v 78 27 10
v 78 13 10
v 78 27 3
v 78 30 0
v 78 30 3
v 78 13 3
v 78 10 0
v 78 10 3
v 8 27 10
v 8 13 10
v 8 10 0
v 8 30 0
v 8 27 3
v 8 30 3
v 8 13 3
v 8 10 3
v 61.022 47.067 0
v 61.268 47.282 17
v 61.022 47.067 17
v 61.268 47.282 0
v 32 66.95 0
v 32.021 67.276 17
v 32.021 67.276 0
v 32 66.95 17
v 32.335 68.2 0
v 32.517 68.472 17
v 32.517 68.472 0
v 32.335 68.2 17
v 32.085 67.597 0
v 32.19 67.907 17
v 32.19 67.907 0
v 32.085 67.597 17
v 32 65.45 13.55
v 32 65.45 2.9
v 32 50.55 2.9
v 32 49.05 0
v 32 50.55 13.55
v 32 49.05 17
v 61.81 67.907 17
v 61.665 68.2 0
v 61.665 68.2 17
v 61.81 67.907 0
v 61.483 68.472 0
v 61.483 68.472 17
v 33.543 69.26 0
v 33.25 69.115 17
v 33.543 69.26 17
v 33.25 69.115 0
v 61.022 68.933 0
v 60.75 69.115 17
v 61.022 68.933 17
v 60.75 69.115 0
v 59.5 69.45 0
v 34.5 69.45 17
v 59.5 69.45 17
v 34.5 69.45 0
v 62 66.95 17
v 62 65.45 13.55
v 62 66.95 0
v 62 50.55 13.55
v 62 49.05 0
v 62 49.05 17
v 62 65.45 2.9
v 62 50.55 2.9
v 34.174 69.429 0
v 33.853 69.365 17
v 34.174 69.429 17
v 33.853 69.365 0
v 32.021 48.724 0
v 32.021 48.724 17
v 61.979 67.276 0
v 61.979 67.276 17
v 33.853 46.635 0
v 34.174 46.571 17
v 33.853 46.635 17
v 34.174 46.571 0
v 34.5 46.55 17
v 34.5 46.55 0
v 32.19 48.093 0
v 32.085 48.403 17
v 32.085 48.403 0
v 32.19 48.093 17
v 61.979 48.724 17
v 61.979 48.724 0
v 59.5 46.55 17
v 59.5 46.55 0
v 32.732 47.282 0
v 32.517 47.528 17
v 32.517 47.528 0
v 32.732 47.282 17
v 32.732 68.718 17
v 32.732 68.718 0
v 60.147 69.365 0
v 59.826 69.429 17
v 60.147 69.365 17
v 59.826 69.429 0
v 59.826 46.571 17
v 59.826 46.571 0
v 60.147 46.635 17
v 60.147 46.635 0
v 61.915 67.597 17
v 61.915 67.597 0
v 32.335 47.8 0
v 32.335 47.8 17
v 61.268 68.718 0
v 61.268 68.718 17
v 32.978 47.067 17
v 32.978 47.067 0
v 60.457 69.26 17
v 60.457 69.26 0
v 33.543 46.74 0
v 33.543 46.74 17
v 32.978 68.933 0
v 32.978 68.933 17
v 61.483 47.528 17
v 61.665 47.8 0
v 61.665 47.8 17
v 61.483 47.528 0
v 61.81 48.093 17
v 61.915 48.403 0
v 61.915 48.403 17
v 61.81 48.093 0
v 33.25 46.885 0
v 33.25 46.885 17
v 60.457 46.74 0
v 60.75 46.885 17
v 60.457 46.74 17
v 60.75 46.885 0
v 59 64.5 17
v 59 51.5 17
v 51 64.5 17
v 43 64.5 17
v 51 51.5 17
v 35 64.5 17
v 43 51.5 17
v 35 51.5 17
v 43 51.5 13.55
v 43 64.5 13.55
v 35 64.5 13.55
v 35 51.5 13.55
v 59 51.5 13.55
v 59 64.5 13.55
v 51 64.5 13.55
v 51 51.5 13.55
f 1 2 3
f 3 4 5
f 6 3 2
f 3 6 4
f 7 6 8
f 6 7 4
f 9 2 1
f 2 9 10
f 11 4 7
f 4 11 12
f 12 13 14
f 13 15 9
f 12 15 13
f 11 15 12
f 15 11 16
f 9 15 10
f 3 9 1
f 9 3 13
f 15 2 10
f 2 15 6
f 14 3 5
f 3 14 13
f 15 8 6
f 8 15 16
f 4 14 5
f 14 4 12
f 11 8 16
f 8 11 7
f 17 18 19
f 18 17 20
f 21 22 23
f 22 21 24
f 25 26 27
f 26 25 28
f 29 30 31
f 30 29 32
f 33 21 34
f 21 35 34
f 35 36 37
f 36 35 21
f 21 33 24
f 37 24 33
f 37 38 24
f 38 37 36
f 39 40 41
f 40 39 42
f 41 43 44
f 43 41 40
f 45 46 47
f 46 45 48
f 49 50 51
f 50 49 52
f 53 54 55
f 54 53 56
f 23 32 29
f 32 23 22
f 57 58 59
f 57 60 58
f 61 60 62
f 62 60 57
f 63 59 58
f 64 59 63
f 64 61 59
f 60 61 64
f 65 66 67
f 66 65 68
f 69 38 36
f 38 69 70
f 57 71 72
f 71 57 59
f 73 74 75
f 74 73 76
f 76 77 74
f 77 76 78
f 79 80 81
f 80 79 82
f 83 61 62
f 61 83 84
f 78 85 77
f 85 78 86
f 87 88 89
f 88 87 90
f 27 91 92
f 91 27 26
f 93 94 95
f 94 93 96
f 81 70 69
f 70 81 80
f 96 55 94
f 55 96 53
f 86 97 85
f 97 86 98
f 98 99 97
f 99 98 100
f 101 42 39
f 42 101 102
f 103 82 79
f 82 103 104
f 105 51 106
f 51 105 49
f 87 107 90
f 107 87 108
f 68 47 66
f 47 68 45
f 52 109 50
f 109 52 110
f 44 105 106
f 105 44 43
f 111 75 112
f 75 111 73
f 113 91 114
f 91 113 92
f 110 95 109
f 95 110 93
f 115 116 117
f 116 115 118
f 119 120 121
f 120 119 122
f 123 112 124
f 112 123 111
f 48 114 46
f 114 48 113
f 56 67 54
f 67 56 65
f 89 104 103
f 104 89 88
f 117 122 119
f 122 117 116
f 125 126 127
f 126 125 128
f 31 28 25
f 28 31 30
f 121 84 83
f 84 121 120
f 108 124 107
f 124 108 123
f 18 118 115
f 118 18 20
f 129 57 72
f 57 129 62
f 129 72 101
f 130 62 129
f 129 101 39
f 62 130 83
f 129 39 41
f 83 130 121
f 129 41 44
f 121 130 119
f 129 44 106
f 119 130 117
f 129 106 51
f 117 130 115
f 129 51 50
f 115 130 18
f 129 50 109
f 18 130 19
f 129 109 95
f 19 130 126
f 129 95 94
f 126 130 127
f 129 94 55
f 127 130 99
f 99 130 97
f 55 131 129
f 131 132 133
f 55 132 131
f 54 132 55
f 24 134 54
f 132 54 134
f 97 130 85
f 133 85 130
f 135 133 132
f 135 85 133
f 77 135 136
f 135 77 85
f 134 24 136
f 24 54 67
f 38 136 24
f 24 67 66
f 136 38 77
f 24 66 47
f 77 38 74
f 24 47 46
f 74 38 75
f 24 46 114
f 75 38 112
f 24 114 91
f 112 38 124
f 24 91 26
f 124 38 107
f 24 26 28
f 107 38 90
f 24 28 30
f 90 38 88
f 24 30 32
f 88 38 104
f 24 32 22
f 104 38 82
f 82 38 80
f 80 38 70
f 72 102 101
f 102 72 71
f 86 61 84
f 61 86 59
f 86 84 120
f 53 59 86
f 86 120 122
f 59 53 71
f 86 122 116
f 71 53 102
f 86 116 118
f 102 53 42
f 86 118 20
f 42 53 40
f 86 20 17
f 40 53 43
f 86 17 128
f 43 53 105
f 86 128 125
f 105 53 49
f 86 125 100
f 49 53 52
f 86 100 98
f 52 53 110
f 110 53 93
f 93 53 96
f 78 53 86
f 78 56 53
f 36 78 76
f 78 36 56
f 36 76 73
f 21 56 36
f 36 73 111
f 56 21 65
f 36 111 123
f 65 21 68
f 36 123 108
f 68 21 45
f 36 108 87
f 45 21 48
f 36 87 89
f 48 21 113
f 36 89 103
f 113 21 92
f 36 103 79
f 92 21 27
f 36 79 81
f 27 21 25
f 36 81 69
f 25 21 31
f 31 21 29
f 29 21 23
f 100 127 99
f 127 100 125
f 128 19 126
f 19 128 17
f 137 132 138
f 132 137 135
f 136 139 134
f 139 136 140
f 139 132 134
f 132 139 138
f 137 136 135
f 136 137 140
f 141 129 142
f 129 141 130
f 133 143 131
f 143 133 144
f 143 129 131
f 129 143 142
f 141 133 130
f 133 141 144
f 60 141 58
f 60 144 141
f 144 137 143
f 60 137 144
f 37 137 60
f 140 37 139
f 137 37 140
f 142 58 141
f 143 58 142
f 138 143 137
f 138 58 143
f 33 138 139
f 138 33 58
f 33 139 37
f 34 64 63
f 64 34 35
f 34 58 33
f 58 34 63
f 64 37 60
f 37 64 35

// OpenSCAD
/*
Sample 095: Vorgespannter Feder-Schlitten — steif
Generated from the FDM Mechanical Sample Library.
Units: millimetres.

Override examples:
  openscad -o custom.stl -D 'view="plate"' -D 'render_fn=64' model.scad
  openscad -o preview.png -D 'view="assembly"' model.scad
*/
use <../../../library/fdm_mechanisms.scad>

render_fn = is_undef(render_fn) ? 48 : render_fn;
view = is_undef(view) ? "plate" : view;
$fn = render_fn;

sample_preload_slider(
    view=view,
    clearance=0.45,
    beam_t=1.2
);
